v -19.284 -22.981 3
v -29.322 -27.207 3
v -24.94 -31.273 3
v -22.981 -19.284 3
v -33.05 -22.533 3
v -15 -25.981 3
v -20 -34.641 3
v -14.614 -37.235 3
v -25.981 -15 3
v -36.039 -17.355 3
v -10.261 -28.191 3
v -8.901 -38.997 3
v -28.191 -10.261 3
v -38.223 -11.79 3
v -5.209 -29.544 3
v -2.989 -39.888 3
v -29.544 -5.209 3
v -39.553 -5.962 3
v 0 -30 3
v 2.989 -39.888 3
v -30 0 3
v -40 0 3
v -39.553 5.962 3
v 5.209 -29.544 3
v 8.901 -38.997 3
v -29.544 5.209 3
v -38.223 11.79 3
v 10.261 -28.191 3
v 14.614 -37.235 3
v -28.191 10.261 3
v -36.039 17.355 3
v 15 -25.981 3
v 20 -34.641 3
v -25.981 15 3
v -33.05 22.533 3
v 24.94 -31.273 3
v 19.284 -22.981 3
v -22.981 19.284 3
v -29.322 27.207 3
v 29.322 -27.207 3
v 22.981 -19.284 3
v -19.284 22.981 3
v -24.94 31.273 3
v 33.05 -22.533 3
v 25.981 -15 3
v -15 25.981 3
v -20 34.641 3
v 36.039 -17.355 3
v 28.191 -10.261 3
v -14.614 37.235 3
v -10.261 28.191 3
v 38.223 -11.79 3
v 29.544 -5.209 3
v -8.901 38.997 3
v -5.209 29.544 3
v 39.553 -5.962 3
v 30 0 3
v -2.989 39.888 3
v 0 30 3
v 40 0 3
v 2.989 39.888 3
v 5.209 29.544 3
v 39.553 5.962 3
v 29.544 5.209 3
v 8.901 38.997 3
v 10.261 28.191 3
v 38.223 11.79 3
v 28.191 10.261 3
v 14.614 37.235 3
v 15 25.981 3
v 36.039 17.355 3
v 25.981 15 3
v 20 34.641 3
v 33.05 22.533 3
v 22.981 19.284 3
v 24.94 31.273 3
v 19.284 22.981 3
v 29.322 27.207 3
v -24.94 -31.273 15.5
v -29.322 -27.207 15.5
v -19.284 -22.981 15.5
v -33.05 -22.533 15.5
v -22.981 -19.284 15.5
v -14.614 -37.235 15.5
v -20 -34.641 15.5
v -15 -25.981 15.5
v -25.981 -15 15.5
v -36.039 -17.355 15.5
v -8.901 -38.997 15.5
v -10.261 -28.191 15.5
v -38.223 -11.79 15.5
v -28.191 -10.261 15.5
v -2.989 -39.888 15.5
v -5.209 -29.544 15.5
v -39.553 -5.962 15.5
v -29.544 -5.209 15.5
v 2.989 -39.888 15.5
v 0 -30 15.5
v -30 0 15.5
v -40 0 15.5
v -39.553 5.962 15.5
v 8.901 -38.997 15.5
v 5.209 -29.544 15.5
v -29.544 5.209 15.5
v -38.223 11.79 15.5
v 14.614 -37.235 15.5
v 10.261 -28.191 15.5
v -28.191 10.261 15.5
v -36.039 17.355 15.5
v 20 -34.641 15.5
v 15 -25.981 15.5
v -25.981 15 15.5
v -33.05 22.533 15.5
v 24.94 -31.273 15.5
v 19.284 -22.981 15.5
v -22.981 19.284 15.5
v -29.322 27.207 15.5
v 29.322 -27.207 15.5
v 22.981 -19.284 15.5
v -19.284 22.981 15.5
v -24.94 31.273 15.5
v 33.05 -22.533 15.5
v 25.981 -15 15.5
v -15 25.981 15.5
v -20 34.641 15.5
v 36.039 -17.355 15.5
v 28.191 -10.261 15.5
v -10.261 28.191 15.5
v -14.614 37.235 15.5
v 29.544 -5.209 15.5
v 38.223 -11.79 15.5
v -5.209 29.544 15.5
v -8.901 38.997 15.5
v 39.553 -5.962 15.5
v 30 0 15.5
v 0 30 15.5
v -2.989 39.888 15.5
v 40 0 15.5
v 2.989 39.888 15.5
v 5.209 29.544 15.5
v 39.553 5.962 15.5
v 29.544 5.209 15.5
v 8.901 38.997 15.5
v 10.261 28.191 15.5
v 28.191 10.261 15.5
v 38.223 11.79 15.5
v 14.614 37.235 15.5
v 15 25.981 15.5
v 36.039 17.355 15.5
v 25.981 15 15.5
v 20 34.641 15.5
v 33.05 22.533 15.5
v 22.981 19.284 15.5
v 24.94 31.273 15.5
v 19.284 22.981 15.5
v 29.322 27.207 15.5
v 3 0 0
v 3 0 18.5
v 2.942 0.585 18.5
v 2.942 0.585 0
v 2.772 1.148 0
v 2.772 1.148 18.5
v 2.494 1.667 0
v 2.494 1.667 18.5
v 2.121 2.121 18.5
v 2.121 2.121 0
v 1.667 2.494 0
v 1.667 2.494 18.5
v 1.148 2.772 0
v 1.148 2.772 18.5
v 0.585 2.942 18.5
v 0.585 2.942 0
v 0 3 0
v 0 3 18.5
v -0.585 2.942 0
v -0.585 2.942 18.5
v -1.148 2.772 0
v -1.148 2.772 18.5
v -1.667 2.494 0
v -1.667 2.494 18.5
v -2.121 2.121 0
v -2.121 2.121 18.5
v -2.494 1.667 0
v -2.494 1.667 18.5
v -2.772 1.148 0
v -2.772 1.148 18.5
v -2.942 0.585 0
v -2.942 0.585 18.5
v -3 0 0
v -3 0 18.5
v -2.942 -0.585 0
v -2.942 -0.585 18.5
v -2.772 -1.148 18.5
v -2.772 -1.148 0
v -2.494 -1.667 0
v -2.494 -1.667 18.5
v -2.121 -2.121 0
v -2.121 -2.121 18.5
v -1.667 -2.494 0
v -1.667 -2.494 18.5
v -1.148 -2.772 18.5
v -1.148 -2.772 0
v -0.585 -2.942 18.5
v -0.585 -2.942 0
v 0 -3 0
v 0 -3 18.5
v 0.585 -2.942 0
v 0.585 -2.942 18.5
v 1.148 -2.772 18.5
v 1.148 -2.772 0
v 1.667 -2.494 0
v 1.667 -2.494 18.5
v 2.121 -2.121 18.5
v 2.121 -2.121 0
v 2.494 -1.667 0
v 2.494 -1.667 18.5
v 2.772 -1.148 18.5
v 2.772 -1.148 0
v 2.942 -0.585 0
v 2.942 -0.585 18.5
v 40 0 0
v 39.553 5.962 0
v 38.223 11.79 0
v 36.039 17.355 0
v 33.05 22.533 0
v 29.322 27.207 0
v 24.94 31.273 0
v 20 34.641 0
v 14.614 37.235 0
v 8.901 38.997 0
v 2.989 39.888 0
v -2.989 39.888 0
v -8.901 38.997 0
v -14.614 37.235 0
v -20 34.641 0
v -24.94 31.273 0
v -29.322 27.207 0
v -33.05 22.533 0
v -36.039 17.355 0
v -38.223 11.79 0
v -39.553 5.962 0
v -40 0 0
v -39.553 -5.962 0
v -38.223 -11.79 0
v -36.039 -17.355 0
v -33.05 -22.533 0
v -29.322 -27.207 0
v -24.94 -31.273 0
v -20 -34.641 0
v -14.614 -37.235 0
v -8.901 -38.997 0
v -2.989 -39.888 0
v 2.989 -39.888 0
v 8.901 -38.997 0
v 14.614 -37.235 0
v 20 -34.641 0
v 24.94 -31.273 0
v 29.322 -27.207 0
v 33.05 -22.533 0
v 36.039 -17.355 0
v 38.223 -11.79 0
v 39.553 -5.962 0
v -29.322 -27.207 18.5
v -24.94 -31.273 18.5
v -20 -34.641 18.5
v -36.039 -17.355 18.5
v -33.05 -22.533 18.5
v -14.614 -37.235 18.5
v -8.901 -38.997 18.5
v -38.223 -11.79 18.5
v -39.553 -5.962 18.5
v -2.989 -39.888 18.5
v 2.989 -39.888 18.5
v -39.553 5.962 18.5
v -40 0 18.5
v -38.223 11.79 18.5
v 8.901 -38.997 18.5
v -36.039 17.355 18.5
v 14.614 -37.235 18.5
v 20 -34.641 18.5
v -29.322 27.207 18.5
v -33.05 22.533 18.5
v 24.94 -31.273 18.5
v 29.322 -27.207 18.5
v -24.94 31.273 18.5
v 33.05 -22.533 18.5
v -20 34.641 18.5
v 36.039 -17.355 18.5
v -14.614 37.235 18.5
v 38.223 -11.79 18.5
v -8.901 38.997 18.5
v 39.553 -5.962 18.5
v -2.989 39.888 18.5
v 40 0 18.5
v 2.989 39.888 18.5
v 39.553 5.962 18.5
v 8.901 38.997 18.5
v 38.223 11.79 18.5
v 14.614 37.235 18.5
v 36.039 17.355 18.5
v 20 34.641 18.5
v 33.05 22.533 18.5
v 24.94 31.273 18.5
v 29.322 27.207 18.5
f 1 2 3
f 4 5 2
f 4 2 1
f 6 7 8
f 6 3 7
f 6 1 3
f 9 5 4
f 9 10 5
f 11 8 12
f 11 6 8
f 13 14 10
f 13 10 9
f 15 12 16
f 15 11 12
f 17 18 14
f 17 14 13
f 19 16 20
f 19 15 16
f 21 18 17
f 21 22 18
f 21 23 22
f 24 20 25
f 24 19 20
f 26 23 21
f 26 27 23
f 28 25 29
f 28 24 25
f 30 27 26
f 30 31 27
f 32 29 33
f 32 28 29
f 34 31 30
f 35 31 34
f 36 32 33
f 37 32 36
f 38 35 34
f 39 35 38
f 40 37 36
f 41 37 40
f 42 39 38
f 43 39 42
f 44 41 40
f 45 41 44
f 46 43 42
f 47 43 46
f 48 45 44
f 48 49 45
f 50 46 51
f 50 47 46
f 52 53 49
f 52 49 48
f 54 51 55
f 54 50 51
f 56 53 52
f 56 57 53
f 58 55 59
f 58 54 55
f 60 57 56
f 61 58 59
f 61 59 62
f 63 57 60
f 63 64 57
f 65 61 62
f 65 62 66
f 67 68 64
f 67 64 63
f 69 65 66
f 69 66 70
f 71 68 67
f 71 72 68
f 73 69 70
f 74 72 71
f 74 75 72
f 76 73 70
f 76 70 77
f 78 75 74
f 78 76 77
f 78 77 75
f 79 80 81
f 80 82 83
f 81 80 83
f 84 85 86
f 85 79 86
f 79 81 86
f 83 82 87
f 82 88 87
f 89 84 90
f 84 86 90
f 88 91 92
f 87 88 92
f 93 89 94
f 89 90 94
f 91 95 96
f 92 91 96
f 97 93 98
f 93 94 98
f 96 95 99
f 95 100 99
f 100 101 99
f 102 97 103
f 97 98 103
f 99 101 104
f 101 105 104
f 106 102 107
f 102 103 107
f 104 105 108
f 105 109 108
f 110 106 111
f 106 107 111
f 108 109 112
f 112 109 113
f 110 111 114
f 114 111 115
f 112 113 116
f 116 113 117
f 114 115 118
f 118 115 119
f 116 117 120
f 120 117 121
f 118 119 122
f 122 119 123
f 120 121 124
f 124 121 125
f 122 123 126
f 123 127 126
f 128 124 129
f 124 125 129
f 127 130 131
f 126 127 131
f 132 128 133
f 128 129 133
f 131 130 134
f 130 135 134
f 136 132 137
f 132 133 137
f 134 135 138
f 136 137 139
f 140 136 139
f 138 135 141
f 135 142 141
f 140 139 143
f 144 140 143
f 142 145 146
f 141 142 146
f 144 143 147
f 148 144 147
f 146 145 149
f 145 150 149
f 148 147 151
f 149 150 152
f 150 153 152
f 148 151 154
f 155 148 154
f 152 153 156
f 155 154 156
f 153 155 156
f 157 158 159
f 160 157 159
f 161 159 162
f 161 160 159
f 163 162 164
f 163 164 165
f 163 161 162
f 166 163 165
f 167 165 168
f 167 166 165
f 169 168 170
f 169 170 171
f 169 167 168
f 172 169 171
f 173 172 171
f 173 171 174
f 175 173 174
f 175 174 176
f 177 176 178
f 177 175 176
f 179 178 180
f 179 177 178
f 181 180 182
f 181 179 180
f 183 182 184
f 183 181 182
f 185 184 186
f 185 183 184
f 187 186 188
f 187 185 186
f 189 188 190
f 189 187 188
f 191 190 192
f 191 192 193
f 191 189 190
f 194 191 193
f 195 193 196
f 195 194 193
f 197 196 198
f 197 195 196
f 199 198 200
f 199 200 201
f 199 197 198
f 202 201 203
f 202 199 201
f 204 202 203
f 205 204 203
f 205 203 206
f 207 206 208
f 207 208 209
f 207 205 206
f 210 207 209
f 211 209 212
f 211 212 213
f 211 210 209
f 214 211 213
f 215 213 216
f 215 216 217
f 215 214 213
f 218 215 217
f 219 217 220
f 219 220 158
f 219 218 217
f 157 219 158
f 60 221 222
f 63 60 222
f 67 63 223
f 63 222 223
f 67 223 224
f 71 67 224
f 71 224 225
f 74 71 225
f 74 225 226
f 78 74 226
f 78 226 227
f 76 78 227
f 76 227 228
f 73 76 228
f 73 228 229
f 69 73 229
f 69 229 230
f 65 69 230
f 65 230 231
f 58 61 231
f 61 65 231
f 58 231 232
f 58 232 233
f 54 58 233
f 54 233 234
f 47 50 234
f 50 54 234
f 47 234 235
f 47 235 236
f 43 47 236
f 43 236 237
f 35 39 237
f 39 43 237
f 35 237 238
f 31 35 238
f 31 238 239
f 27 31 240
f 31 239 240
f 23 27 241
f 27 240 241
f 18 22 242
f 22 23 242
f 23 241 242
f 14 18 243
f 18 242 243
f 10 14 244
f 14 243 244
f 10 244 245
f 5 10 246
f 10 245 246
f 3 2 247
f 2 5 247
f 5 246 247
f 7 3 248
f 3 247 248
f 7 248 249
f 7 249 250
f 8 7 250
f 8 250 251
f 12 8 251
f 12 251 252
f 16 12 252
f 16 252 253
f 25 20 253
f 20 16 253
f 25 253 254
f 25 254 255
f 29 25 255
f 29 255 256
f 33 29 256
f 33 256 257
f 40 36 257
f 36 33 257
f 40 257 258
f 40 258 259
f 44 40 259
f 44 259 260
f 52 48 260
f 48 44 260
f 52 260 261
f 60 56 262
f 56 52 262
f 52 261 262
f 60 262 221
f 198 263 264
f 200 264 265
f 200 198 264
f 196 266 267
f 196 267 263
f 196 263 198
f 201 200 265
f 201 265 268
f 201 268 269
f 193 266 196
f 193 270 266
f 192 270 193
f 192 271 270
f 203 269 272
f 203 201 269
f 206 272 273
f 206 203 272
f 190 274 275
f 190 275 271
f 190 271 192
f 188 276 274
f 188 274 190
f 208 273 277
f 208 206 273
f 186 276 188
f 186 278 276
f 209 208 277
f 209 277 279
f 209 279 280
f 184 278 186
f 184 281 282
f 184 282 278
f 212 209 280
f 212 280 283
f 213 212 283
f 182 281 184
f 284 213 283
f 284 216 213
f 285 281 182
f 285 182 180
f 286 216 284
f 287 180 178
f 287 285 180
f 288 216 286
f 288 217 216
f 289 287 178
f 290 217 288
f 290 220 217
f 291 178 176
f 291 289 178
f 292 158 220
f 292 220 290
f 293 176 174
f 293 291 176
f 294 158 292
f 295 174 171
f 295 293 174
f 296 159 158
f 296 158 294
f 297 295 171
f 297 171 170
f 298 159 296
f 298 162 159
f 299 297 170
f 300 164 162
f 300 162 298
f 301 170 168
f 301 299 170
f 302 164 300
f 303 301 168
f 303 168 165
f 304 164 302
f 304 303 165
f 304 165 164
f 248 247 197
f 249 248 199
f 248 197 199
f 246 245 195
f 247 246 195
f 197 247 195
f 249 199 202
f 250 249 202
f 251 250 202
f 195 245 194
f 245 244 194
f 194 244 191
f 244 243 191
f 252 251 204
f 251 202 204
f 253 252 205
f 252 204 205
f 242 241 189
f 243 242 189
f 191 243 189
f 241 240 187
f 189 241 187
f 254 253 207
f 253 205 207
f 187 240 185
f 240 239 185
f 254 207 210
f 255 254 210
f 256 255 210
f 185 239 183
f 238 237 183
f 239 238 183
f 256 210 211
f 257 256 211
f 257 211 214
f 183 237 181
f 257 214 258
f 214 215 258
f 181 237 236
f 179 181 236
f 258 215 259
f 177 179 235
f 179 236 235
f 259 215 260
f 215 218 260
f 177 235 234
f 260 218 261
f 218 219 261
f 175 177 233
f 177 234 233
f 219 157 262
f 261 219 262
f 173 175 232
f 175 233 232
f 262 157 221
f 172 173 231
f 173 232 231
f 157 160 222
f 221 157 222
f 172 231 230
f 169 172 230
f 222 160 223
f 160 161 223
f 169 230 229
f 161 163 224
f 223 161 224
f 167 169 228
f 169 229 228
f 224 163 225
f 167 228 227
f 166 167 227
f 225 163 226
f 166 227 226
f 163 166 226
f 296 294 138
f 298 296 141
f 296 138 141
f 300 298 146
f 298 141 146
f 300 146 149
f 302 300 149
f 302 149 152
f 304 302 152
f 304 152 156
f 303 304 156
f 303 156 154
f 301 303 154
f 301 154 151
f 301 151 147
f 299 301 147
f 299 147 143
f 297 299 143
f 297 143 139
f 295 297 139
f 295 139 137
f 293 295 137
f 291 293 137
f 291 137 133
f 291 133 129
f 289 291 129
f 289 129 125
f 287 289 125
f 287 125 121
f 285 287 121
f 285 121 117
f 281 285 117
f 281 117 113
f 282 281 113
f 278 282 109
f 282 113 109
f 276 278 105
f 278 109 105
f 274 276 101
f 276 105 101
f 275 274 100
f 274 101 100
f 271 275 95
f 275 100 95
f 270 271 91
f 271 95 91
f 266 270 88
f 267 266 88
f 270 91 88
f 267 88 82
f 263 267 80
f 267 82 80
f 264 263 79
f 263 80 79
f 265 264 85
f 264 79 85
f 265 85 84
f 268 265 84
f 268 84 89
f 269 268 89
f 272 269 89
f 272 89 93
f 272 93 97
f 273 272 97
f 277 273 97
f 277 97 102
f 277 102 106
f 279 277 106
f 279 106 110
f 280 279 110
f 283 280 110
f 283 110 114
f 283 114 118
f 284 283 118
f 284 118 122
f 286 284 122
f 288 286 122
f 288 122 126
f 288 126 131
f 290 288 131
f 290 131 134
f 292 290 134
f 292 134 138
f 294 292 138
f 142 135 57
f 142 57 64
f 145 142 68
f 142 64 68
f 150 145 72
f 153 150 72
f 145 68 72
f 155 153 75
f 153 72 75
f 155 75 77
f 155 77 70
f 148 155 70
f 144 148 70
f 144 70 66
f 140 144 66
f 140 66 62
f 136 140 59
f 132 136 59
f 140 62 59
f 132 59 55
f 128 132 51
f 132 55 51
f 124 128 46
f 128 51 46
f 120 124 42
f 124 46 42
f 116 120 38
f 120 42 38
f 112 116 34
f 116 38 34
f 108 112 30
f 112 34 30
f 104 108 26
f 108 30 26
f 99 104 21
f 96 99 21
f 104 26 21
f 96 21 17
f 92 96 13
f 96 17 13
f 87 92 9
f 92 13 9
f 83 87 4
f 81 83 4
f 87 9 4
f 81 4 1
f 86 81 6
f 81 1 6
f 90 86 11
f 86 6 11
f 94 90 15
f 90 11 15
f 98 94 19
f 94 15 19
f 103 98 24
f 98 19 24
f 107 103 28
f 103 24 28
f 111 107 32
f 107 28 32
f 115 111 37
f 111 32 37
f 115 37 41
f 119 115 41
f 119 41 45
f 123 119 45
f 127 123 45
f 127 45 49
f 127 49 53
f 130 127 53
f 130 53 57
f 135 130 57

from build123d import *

# Parameters (mm, degrees)
SKETCH1_R               = 40
SKETCH1_R_2             = 30
SKETCH1_R_3             = 3
BOSS_EXTRUDE1_DEPTH     = 18.5
CUT_EXTRUDE1_DEPTH      = 6.25
CUT_EXTRUDE1_DEPTH_BACK = 6.25
SKETCH2_R               = 42.5
SKETCH2_R_2             = 30


with BuildPart() as part:
    # Sketch1 → Boss-Extrude1 (new body)
    # profile 1 of 2: a face of its own
    with BuildSketch(Plane.XY):
        Circle(SKETCH1_R)
        Circle(SKETCH1_R_2, mode=Mode.SUBTRACT)
    # profile 2 of 2: a face of its own
    with BuildSketch(Plane.XY):
        Circle(SKETCH1_R_2)
        Circle(SKETCH1_R_3, mode=Mode.SUBTRACT)
    extrude(amount=BOSS_EXTRUDE1_DEPTH)

    # Sketch2 → Cut-Extrude1 (cut, two sides: drawn at the far end of the back side and taken through both)
    with BuildSketch(Plane.XY.offset(9.25).offset(-CUT_EXTRUDE1_DEPTH_BACK)):
        Circle(SKETCH2_R)
        Circle(SKETCH2_R_2, mode=Mode.SUBTRACT)
    extrude(amount=CUT_EXTRUDE1_DEPTH + CUT_EXTRUDE1_DEPTH_BACK, mode=Mode.SUBTRACT)


solid = part.part
